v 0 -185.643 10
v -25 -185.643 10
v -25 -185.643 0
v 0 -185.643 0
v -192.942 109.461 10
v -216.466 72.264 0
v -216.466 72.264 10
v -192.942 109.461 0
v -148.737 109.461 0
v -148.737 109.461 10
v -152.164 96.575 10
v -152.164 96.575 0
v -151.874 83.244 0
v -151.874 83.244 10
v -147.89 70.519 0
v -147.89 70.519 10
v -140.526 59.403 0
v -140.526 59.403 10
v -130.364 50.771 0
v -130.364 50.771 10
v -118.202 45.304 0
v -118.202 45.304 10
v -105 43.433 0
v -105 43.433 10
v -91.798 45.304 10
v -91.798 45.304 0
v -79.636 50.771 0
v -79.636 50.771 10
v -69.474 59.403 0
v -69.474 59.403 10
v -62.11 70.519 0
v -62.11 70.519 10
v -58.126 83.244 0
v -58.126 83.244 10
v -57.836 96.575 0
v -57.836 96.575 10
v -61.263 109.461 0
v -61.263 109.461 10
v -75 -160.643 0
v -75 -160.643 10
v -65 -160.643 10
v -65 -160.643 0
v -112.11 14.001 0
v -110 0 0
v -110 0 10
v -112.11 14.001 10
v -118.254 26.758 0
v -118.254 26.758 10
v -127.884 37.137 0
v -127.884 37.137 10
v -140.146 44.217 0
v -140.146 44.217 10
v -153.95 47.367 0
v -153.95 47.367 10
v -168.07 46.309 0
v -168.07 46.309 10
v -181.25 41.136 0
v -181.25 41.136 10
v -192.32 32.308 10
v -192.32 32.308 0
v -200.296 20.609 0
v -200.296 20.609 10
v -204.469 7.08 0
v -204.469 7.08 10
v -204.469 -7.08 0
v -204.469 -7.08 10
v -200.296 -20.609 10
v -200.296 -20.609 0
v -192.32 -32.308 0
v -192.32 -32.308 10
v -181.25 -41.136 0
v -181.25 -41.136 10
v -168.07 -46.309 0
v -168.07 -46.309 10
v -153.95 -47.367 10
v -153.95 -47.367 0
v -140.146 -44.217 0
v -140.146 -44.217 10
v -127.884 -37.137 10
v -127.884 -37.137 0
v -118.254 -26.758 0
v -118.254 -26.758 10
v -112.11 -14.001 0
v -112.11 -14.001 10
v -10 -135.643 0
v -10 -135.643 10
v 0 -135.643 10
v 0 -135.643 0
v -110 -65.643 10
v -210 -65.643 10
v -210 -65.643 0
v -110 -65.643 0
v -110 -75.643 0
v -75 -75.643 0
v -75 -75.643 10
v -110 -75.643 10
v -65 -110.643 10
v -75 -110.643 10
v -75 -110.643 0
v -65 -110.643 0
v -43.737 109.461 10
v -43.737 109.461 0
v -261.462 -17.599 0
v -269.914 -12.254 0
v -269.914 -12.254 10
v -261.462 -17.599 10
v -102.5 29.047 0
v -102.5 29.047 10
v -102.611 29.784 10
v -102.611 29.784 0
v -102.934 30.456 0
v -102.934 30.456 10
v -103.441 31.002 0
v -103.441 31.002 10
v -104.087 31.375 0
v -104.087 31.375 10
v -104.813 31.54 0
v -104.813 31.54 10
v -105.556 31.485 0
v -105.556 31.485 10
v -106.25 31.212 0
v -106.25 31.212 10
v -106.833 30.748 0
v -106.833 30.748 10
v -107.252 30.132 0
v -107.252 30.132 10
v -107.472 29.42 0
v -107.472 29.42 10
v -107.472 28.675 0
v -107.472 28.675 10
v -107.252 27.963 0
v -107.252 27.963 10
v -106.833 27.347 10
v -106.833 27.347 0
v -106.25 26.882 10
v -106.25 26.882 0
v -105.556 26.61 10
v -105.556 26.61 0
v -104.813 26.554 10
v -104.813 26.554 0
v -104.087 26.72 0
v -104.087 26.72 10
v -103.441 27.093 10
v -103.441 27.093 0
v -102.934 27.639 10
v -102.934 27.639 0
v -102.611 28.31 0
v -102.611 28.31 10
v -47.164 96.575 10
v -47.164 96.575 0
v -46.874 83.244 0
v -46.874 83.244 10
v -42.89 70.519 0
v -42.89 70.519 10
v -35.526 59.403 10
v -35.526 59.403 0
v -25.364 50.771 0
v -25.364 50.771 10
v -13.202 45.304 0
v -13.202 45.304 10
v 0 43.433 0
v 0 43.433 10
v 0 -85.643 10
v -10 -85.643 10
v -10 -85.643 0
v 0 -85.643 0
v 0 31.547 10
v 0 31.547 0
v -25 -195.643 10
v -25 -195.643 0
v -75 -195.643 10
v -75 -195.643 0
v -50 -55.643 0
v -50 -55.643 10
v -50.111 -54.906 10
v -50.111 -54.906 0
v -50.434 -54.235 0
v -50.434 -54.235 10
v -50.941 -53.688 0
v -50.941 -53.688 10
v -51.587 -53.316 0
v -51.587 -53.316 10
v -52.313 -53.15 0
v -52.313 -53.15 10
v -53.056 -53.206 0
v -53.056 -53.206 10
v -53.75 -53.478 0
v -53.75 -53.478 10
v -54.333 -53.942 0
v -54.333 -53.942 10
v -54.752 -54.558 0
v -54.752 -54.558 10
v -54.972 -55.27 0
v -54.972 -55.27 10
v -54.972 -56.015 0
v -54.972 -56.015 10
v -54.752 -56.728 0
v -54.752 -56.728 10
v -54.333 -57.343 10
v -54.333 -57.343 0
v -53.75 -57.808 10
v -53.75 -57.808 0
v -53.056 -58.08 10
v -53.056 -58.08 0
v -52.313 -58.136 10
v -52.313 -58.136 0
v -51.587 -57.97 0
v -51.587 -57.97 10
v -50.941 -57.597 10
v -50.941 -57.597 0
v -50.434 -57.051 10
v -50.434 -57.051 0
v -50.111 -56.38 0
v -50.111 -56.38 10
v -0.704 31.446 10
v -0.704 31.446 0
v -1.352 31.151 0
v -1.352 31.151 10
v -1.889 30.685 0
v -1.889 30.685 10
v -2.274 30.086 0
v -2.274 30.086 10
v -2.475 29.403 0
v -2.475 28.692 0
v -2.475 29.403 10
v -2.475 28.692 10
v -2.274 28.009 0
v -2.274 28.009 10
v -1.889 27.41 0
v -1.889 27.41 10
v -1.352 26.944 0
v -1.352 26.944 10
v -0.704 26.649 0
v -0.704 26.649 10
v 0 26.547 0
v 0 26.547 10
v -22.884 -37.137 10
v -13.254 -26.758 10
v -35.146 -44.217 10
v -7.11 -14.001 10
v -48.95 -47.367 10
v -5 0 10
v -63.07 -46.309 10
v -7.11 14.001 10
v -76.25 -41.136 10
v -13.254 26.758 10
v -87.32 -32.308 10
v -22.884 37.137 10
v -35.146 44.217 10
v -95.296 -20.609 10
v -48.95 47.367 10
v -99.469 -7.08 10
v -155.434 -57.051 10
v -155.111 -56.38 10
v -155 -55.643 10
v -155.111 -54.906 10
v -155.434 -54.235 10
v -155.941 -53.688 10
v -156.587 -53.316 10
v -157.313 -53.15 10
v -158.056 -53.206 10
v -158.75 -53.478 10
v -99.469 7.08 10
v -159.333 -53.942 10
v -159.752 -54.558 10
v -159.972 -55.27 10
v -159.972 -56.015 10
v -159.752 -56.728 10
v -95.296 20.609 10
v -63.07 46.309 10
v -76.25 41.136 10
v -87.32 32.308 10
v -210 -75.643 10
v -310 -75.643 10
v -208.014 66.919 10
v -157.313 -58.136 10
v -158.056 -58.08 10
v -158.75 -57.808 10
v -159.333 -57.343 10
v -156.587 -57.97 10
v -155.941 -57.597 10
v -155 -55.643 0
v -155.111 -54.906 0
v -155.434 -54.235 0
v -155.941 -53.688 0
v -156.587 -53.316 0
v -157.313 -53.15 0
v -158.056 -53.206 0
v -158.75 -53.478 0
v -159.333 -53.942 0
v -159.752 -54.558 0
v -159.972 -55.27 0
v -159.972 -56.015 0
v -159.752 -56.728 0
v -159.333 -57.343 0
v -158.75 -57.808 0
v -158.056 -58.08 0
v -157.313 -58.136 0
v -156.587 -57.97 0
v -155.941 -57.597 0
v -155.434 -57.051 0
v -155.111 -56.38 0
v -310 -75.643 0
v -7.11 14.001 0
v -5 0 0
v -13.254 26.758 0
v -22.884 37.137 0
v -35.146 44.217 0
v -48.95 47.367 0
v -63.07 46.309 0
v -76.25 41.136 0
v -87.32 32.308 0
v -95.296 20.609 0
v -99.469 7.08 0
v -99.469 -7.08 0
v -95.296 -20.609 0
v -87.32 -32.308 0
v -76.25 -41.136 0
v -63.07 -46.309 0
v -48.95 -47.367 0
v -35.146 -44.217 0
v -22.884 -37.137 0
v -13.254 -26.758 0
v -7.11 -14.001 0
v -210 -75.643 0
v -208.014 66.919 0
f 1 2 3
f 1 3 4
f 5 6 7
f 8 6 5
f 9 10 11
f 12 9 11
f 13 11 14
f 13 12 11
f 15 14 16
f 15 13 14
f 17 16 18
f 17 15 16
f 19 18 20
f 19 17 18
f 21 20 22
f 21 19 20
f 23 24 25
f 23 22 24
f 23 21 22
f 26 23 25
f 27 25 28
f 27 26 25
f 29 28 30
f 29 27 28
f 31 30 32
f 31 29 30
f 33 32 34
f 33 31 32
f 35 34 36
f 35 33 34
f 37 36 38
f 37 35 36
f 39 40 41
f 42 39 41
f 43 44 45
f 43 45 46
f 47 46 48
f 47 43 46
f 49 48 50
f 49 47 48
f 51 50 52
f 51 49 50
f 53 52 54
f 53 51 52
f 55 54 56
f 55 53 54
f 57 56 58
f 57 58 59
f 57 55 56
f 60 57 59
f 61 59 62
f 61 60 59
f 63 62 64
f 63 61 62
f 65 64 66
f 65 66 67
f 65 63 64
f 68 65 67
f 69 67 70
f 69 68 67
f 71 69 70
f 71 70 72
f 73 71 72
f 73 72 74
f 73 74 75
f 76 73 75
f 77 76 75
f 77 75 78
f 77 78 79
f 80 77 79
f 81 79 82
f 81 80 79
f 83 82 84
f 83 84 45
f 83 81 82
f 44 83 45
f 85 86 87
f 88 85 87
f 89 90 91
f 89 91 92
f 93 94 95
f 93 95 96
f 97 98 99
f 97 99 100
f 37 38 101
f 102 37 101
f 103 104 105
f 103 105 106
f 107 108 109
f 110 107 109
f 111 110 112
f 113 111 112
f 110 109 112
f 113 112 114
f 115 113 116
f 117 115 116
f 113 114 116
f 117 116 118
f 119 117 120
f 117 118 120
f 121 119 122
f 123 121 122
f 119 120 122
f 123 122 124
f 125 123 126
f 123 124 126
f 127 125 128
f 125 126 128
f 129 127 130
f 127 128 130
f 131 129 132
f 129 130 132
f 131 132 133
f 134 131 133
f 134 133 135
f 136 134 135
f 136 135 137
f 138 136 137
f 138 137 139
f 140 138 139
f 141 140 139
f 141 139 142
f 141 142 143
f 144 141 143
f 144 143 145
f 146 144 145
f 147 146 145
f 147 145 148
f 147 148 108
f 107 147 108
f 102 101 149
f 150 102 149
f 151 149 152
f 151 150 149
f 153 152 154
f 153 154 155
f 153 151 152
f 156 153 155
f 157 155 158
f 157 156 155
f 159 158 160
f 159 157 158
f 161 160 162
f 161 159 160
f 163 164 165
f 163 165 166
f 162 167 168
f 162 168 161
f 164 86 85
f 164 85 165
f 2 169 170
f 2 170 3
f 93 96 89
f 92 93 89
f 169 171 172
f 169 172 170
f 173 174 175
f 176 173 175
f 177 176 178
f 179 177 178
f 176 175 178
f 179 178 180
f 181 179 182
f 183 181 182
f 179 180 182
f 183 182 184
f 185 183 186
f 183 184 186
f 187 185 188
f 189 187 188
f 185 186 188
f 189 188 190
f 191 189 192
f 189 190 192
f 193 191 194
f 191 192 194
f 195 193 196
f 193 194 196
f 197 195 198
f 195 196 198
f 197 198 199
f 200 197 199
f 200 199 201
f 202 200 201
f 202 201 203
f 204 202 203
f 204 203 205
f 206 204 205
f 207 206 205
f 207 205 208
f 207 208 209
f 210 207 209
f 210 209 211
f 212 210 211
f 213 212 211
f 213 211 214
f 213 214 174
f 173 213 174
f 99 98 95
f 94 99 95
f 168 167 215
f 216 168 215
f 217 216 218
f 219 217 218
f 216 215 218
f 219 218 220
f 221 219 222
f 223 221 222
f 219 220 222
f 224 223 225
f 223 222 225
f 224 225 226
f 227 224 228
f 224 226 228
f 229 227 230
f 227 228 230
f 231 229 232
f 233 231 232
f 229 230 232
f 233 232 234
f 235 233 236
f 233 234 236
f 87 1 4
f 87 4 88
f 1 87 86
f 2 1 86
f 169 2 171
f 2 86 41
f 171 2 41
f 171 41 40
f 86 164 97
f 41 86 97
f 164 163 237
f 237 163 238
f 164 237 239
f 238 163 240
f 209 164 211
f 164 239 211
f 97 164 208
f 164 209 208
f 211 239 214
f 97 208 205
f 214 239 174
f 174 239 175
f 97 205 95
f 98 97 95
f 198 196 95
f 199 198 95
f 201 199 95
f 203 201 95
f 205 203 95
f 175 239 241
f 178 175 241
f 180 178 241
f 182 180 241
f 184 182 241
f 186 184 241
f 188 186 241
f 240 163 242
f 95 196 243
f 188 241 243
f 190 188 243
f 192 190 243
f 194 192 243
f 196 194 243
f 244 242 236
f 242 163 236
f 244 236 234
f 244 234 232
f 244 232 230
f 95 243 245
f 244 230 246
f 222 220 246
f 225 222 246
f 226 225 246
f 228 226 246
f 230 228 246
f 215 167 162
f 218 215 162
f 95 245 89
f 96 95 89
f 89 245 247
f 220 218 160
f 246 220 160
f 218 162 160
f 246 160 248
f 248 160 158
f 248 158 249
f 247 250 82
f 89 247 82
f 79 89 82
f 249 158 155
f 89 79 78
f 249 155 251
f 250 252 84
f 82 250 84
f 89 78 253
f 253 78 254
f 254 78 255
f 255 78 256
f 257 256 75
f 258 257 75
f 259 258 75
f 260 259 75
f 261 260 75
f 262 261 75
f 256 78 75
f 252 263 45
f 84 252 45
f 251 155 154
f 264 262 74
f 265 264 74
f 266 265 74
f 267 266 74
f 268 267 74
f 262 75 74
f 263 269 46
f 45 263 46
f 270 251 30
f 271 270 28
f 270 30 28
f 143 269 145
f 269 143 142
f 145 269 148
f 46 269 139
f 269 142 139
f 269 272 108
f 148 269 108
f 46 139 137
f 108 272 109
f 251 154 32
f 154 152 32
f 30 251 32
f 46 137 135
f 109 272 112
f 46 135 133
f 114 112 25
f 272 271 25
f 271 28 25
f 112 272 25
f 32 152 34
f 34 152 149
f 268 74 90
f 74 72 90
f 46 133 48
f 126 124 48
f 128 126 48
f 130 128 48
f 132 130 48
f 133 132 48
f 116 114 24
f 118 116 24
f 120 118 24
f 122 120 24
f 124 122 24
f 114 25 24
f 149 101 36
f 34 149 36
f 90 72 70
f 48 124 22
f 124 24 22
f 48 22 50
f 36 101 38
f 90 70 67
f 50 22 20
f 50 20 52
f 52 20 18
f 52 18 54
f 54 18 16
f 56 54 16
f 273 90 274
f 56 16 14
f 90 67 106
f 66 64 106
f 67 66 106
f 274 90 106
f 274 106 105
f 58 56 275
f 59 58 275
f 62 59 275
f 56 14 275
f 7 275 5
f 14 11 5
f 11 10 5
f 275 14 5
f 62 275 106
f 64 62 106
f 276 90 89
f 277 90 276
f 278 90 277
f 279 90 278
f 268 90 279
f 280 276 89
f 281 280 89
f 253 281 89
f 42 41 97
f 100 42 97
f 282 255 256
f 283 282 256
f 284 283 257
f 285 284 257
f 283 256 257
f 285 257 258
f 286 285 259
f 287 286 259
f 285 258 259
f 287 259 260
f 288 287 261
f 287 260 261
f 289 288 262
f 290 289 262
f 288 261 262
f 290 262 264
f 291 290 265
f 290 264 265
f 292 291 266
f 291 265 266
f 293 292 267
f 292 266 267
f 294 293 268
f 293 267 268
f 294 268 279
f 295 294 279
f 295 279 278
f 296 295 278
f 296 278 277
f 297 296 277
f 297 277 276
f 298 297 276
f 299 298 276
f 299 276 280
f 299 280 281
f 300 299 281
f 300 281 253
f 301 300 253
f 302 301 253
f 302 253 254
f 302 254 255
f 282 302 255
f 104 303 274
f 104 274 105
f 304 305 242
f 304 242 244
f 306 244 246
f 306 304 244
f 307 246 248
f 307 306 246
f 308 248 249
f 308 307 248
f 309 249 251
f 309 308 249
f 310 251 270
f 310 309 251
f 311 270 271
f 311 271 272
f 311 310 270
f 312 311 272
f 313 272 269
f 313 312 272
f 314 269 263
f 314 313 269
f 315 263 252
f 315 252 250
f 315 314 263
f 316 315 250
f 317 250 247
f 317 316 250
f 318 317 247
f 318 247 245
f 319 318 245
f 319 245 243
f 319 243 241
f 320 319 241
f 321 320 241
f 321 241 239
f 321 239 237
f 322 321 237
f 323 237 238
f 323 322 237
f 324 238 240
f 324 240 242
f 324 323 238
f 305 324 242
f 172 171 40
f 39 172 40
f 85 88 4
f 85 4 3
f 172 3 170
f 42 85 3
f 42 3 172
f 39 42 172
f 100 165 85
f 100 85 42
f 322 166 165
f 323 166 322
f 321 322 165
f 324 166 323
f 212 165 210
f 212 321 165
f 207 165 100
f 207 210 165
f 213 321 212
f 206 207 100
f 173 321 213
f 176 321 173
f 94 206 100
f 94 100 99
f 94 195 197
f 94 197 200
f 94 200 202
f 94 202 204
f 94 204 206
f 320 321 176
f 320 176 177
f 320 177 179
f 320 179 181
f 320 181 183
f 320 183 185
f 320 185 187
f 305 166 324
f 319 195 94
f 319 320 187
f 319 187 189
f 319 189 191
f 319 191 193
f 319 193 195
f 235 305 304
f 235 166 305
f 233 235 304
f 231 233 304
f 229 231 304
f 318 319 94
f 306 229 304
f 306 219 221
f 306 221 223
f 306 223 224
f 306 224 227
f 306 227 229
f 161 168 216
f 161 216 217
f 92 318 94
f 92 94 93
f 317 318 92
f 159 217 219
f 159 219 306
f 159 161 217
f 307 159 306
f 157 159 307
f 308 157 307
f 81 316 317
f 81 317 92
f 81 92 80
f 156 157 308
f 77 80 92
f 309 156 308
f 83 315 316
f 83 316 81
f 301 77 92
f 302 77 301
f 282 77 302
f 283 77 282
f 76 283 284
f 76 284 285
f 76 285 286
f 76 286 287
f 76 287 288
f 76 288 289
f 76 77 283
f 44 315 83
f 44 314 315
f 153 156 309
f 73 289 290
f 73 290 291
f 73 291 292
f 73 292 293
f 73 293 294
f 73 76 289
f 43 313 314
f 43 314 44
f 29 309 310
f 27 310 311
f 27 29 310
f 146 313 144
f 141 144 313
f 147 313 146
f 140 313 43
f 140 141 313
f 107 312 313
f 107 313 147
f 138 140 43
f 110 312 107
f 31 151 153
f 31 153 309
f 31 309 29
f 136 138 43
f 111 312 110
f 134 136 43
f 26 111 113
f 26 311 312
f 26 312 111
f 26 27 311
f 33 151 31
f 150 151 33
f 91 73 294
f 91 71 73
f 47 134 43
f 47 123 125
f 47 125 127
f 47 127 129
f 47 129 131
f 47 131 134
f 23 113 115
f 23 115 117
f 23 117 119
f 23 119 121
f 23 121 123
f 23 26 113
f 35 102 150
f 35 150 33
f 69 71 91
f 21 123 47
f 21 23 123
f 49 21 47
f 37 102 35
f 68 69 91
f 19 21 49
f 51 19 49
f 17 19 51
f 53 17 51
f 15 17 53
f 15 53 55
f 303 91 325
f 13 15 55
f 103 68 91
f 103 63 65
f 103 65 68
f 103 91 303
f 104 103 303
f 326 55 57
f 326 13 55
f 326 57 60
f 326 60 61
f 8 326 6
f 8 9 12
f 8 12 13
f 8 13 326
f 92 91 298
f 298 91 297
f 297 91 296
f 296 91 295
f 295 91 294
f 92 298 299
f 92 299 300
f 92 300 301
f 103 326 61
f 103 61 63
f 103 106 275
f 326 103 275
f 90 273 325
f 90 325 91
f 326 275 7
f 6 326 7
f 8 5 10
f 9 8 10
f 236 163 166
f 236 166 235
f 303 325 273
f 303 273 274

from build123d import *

# Parameters (mm, degrees)
ESQUISSE1_R             = 47.5
BOSS_EXTRU_1_DEPTH      = 10
ESQUISSE3_W             = 100
ESQUISSE3_H             = 10
ENL_V_MAT_EXTRU_1_DEPTH = 11
ESQUISSE4_R             = 2.5
ENL_V_MAT_EXTRU_2_DEPTH = 11
ESQUISSE6_W             = 150
ESQUISSE6_H             = 120
BOSS_EXTRU_2_DEPTH      = 10
ESQUISSE7_W             = 10
ESQUISSE7_H             = 50
ESQUISSE7_W_2           = 50
ESQUISSE7_H_2           = 10
ENL_V_MAT_EXTRU_3_DEPTH = 10
ESQUISSE9_W             = 316.248151929
ESQUISSE9_H             = 610.204039151
ENL_V_MAT_EXTRU_4_DEPTH = 10
ESQUISSE10_W            = 334.898216685
ESQUISSE10_H            = 314.009507296
ENL_V_MAT_EXTRU_6_DEPTH = 10
ESQUISSE11_W            = 10
ESQUISSE11_H            = 50
ENL_V_MAT_EXTRU_7_DEPTH = 10


with BuildPart() as part:
    # Esquisse1 → Boss.-Extru.1 (new body)
    with BuildSketch(Plane.XY):
        Polygon((-310, -75.642859016), (0, 414.561180135), (310, -75.642859016), align=None)
        with Locations((-157.5, 0)):
            Circle(ESQUISSE1_R, mode=Mode.SUBTRACT)
        with Locations((-52.5, 0)):
            Circle(ESQUISSE1_R, mode=Mode.SUBTRACT)
        with Locations((52.5, 0)):
            Circle(ESQUISSE1_R, mode=Mode.SUBTRACT)
        with Locations((157.5, 0)):
            Circle(ESQUISSE1_R, mode=Mode.SUBTRACT)
        with Locations((-105, 90.932667397)):
            Circle(ESQUISSE1_R, mode=Mode.SUBTRACT)
        with Locations((0, 90.932667397)):
            Circle(ESQUISSE1_R, mode=Mode.SUBTRACT)
        with Locations((105, 90.932667397)):
            Circle(ESQUISSE1_R, mode=Mode.SUBTRACT)
        with Locations((-52.5, 181.865334795)):
            Circle(ESQUISSE1_R, mode=Mode.SUBTRACT)
        with Locations((52.5, 181.865334795)):
            Circle(ESQUISSE1_R, mode=Mode.SUBTRACT)
        with Locations((0, 272.798002192)):
            Circle(ESQUISSE1_R, mode=Mode.SUBTRACT)
    extrude(amount=BOSS_EXTRU_1_DEPTH)

    # Esquisse3 → Enlèv. mat.-Extru.1 (cut, through all)
    with BuildSketch(Plane.XY.offset(10)):
        Polygon((-269.913793103, -12.254405678), (-261.461999325, -17.599233264), (-208.013723463, 66.918704521), (-216.465517241, 72.263532107), align=None)
        Polygon((-181.724137931, 127.200191667), (-173.272344153, 121.855364081), (-119.82406829, 206.373301865), (-128.275862069, 211.718129452), align=None)
        Polygon((-93.534482759, 266.654789012), (-85.08268898, 261.309961425), (-31.634413118, 345.82789921), (-40.086206897, 351.172726796), align=None)
        Polygon((269.913793103, -12.254405678), (261.461999325, -17.599233264), (208.013723463, 66.918704521), (216.465517241, 72.263532107), align=None)
        Polygon((181.724137931, 127.200191667), (173.272344153, 121.855364081), (119.82406829, 206.373301865), (128.275862069, 211.718129452), align=None)
        Polygon((93.534482759, 266.654789012), (85.08268898, 261.309961425), (31.634413118, 345.82789921), (40.086206897, 351.172726796), align=None)
        with Locations((-160, -70.642859016)):
            Rectangle(ESQUISSE3_W, ESQUISSE3_H)
        with Locations((160, -70.642859016)):
            Rectangle(ESQUISSE3_W, ESQUISSE3_H)
    extrude(amount=-ENL_V_MAT_EXTRU_1_DEPTH, mode=Mode.SUBTRACT)

    # Esquisse4 → Enlèv. mat.-Extru.2 (cut, through all)
    with BuildSketch(Plane.XY.offset(10)):
        with Locations((-157.5, -55.642859016)):
            Circle(ESQUISSE4_R)
        with Locations((-52.5, -55.642859016)):
            Circle(ESQUISSE4_R)
        with Locations((52.5, -55.642859016)):
            Circle(ESQUISSE4_R)
        with Locations((157.5, -55.642859016)):
            Circle(ESQUISSE4_R)
        with Locations((-105, 29.047375097)):
            Circle(ESQUISSE4_R)
        with Locations((0, 29.047375097)):
            Circle(ESQUISSE4_R)
        with Locations((105, 29.047375097)):
            Circle(ESQUISSE4_R)
        with Locations((-52.5, 119.980042494)):
            Circle(ESQUISSE4_R)
        with Locations((52.5, 119.980042494)):
            Circle(ESQUISSE4_R)
        with Locations((0, 210.912709891)):
            Circle(ESQUISSE4_R)
    extrude(amount=-ENL_V_MAT_EXTRU_2_DEPTH, mode=Mode.SUBTRACT)

    # Esquisse6 → Boss.-Extru.2 (add)
    with BuildSketch(Plane.XY.offset(10)):
        with Locations((0, -135.642859016)):
            Rectangle(ESQUISSE6_W, ESQUISSE6_H)
    extrude(amount=-BOSS_EXTRU_2_DEPTH)

    # Esquisse7 → Enlèv. mat.-Extru.3 (cut)
    with BuildSketch(Plane.XY.offset(10)):
        with Locations((-70, -135.642859016)):
            Rectangle(ESQUISSE7_W, ESQUISSE7_H)
        with Locations((0, -190.642859016)):
            Rectangle(ESQUISSE7_W_2, ESQUISSE7_H_2)
        with Locations((70, -135.642859016)):
            Rectangle(ESQUISSE7_W, ESQUISSE7_H)
    extrude(amount=-ENL_V_MAT_EXTRU_3_DEPTH, mode=Mode.SUBTRACT)

    # Esquisse9 → Enlèv. mat.-Extru.4 (cut)
    with BuildSketch(Plane.XY.offset(10)):
        with Locations((158.124075965, 109.45916056)):
            Rectangle(ESQUISSE9_W, ESQUISSE9_H)
    extrude(amount=-ENL_V_MAT_EXTRU_4_DEPTH, mode=Mode.SUBTRACT)

    # Esquisse10 → Enlèv. mat.-Extru.6 (cut)
    with BuildSketch(Plane.XY.offset(10)):
        with Locations((-167.449108343, 266.465933783)):
            Rectangle(ESQUISSE10_W, ESQUISSE10_H)
    extrude(amount=-ENL_V_MAT_EXTRU_6_DEPTH, mode=Mode.SUBTRACT)

    # Esquisse11 → Enlèv. mat.-Extru.7 (cut)
    with BuildSketch(Plane.XY.offset(10)):
        with Locations((-5, -110.642859016)):
            Rectangle(ESQUISSE11_W, ESQUISSE11_H)
    extrude(amount=-ENL_V_MAT_EXTRU_7_DEPTH, mode=Mode.SUBTRACT)


solid = part.part
